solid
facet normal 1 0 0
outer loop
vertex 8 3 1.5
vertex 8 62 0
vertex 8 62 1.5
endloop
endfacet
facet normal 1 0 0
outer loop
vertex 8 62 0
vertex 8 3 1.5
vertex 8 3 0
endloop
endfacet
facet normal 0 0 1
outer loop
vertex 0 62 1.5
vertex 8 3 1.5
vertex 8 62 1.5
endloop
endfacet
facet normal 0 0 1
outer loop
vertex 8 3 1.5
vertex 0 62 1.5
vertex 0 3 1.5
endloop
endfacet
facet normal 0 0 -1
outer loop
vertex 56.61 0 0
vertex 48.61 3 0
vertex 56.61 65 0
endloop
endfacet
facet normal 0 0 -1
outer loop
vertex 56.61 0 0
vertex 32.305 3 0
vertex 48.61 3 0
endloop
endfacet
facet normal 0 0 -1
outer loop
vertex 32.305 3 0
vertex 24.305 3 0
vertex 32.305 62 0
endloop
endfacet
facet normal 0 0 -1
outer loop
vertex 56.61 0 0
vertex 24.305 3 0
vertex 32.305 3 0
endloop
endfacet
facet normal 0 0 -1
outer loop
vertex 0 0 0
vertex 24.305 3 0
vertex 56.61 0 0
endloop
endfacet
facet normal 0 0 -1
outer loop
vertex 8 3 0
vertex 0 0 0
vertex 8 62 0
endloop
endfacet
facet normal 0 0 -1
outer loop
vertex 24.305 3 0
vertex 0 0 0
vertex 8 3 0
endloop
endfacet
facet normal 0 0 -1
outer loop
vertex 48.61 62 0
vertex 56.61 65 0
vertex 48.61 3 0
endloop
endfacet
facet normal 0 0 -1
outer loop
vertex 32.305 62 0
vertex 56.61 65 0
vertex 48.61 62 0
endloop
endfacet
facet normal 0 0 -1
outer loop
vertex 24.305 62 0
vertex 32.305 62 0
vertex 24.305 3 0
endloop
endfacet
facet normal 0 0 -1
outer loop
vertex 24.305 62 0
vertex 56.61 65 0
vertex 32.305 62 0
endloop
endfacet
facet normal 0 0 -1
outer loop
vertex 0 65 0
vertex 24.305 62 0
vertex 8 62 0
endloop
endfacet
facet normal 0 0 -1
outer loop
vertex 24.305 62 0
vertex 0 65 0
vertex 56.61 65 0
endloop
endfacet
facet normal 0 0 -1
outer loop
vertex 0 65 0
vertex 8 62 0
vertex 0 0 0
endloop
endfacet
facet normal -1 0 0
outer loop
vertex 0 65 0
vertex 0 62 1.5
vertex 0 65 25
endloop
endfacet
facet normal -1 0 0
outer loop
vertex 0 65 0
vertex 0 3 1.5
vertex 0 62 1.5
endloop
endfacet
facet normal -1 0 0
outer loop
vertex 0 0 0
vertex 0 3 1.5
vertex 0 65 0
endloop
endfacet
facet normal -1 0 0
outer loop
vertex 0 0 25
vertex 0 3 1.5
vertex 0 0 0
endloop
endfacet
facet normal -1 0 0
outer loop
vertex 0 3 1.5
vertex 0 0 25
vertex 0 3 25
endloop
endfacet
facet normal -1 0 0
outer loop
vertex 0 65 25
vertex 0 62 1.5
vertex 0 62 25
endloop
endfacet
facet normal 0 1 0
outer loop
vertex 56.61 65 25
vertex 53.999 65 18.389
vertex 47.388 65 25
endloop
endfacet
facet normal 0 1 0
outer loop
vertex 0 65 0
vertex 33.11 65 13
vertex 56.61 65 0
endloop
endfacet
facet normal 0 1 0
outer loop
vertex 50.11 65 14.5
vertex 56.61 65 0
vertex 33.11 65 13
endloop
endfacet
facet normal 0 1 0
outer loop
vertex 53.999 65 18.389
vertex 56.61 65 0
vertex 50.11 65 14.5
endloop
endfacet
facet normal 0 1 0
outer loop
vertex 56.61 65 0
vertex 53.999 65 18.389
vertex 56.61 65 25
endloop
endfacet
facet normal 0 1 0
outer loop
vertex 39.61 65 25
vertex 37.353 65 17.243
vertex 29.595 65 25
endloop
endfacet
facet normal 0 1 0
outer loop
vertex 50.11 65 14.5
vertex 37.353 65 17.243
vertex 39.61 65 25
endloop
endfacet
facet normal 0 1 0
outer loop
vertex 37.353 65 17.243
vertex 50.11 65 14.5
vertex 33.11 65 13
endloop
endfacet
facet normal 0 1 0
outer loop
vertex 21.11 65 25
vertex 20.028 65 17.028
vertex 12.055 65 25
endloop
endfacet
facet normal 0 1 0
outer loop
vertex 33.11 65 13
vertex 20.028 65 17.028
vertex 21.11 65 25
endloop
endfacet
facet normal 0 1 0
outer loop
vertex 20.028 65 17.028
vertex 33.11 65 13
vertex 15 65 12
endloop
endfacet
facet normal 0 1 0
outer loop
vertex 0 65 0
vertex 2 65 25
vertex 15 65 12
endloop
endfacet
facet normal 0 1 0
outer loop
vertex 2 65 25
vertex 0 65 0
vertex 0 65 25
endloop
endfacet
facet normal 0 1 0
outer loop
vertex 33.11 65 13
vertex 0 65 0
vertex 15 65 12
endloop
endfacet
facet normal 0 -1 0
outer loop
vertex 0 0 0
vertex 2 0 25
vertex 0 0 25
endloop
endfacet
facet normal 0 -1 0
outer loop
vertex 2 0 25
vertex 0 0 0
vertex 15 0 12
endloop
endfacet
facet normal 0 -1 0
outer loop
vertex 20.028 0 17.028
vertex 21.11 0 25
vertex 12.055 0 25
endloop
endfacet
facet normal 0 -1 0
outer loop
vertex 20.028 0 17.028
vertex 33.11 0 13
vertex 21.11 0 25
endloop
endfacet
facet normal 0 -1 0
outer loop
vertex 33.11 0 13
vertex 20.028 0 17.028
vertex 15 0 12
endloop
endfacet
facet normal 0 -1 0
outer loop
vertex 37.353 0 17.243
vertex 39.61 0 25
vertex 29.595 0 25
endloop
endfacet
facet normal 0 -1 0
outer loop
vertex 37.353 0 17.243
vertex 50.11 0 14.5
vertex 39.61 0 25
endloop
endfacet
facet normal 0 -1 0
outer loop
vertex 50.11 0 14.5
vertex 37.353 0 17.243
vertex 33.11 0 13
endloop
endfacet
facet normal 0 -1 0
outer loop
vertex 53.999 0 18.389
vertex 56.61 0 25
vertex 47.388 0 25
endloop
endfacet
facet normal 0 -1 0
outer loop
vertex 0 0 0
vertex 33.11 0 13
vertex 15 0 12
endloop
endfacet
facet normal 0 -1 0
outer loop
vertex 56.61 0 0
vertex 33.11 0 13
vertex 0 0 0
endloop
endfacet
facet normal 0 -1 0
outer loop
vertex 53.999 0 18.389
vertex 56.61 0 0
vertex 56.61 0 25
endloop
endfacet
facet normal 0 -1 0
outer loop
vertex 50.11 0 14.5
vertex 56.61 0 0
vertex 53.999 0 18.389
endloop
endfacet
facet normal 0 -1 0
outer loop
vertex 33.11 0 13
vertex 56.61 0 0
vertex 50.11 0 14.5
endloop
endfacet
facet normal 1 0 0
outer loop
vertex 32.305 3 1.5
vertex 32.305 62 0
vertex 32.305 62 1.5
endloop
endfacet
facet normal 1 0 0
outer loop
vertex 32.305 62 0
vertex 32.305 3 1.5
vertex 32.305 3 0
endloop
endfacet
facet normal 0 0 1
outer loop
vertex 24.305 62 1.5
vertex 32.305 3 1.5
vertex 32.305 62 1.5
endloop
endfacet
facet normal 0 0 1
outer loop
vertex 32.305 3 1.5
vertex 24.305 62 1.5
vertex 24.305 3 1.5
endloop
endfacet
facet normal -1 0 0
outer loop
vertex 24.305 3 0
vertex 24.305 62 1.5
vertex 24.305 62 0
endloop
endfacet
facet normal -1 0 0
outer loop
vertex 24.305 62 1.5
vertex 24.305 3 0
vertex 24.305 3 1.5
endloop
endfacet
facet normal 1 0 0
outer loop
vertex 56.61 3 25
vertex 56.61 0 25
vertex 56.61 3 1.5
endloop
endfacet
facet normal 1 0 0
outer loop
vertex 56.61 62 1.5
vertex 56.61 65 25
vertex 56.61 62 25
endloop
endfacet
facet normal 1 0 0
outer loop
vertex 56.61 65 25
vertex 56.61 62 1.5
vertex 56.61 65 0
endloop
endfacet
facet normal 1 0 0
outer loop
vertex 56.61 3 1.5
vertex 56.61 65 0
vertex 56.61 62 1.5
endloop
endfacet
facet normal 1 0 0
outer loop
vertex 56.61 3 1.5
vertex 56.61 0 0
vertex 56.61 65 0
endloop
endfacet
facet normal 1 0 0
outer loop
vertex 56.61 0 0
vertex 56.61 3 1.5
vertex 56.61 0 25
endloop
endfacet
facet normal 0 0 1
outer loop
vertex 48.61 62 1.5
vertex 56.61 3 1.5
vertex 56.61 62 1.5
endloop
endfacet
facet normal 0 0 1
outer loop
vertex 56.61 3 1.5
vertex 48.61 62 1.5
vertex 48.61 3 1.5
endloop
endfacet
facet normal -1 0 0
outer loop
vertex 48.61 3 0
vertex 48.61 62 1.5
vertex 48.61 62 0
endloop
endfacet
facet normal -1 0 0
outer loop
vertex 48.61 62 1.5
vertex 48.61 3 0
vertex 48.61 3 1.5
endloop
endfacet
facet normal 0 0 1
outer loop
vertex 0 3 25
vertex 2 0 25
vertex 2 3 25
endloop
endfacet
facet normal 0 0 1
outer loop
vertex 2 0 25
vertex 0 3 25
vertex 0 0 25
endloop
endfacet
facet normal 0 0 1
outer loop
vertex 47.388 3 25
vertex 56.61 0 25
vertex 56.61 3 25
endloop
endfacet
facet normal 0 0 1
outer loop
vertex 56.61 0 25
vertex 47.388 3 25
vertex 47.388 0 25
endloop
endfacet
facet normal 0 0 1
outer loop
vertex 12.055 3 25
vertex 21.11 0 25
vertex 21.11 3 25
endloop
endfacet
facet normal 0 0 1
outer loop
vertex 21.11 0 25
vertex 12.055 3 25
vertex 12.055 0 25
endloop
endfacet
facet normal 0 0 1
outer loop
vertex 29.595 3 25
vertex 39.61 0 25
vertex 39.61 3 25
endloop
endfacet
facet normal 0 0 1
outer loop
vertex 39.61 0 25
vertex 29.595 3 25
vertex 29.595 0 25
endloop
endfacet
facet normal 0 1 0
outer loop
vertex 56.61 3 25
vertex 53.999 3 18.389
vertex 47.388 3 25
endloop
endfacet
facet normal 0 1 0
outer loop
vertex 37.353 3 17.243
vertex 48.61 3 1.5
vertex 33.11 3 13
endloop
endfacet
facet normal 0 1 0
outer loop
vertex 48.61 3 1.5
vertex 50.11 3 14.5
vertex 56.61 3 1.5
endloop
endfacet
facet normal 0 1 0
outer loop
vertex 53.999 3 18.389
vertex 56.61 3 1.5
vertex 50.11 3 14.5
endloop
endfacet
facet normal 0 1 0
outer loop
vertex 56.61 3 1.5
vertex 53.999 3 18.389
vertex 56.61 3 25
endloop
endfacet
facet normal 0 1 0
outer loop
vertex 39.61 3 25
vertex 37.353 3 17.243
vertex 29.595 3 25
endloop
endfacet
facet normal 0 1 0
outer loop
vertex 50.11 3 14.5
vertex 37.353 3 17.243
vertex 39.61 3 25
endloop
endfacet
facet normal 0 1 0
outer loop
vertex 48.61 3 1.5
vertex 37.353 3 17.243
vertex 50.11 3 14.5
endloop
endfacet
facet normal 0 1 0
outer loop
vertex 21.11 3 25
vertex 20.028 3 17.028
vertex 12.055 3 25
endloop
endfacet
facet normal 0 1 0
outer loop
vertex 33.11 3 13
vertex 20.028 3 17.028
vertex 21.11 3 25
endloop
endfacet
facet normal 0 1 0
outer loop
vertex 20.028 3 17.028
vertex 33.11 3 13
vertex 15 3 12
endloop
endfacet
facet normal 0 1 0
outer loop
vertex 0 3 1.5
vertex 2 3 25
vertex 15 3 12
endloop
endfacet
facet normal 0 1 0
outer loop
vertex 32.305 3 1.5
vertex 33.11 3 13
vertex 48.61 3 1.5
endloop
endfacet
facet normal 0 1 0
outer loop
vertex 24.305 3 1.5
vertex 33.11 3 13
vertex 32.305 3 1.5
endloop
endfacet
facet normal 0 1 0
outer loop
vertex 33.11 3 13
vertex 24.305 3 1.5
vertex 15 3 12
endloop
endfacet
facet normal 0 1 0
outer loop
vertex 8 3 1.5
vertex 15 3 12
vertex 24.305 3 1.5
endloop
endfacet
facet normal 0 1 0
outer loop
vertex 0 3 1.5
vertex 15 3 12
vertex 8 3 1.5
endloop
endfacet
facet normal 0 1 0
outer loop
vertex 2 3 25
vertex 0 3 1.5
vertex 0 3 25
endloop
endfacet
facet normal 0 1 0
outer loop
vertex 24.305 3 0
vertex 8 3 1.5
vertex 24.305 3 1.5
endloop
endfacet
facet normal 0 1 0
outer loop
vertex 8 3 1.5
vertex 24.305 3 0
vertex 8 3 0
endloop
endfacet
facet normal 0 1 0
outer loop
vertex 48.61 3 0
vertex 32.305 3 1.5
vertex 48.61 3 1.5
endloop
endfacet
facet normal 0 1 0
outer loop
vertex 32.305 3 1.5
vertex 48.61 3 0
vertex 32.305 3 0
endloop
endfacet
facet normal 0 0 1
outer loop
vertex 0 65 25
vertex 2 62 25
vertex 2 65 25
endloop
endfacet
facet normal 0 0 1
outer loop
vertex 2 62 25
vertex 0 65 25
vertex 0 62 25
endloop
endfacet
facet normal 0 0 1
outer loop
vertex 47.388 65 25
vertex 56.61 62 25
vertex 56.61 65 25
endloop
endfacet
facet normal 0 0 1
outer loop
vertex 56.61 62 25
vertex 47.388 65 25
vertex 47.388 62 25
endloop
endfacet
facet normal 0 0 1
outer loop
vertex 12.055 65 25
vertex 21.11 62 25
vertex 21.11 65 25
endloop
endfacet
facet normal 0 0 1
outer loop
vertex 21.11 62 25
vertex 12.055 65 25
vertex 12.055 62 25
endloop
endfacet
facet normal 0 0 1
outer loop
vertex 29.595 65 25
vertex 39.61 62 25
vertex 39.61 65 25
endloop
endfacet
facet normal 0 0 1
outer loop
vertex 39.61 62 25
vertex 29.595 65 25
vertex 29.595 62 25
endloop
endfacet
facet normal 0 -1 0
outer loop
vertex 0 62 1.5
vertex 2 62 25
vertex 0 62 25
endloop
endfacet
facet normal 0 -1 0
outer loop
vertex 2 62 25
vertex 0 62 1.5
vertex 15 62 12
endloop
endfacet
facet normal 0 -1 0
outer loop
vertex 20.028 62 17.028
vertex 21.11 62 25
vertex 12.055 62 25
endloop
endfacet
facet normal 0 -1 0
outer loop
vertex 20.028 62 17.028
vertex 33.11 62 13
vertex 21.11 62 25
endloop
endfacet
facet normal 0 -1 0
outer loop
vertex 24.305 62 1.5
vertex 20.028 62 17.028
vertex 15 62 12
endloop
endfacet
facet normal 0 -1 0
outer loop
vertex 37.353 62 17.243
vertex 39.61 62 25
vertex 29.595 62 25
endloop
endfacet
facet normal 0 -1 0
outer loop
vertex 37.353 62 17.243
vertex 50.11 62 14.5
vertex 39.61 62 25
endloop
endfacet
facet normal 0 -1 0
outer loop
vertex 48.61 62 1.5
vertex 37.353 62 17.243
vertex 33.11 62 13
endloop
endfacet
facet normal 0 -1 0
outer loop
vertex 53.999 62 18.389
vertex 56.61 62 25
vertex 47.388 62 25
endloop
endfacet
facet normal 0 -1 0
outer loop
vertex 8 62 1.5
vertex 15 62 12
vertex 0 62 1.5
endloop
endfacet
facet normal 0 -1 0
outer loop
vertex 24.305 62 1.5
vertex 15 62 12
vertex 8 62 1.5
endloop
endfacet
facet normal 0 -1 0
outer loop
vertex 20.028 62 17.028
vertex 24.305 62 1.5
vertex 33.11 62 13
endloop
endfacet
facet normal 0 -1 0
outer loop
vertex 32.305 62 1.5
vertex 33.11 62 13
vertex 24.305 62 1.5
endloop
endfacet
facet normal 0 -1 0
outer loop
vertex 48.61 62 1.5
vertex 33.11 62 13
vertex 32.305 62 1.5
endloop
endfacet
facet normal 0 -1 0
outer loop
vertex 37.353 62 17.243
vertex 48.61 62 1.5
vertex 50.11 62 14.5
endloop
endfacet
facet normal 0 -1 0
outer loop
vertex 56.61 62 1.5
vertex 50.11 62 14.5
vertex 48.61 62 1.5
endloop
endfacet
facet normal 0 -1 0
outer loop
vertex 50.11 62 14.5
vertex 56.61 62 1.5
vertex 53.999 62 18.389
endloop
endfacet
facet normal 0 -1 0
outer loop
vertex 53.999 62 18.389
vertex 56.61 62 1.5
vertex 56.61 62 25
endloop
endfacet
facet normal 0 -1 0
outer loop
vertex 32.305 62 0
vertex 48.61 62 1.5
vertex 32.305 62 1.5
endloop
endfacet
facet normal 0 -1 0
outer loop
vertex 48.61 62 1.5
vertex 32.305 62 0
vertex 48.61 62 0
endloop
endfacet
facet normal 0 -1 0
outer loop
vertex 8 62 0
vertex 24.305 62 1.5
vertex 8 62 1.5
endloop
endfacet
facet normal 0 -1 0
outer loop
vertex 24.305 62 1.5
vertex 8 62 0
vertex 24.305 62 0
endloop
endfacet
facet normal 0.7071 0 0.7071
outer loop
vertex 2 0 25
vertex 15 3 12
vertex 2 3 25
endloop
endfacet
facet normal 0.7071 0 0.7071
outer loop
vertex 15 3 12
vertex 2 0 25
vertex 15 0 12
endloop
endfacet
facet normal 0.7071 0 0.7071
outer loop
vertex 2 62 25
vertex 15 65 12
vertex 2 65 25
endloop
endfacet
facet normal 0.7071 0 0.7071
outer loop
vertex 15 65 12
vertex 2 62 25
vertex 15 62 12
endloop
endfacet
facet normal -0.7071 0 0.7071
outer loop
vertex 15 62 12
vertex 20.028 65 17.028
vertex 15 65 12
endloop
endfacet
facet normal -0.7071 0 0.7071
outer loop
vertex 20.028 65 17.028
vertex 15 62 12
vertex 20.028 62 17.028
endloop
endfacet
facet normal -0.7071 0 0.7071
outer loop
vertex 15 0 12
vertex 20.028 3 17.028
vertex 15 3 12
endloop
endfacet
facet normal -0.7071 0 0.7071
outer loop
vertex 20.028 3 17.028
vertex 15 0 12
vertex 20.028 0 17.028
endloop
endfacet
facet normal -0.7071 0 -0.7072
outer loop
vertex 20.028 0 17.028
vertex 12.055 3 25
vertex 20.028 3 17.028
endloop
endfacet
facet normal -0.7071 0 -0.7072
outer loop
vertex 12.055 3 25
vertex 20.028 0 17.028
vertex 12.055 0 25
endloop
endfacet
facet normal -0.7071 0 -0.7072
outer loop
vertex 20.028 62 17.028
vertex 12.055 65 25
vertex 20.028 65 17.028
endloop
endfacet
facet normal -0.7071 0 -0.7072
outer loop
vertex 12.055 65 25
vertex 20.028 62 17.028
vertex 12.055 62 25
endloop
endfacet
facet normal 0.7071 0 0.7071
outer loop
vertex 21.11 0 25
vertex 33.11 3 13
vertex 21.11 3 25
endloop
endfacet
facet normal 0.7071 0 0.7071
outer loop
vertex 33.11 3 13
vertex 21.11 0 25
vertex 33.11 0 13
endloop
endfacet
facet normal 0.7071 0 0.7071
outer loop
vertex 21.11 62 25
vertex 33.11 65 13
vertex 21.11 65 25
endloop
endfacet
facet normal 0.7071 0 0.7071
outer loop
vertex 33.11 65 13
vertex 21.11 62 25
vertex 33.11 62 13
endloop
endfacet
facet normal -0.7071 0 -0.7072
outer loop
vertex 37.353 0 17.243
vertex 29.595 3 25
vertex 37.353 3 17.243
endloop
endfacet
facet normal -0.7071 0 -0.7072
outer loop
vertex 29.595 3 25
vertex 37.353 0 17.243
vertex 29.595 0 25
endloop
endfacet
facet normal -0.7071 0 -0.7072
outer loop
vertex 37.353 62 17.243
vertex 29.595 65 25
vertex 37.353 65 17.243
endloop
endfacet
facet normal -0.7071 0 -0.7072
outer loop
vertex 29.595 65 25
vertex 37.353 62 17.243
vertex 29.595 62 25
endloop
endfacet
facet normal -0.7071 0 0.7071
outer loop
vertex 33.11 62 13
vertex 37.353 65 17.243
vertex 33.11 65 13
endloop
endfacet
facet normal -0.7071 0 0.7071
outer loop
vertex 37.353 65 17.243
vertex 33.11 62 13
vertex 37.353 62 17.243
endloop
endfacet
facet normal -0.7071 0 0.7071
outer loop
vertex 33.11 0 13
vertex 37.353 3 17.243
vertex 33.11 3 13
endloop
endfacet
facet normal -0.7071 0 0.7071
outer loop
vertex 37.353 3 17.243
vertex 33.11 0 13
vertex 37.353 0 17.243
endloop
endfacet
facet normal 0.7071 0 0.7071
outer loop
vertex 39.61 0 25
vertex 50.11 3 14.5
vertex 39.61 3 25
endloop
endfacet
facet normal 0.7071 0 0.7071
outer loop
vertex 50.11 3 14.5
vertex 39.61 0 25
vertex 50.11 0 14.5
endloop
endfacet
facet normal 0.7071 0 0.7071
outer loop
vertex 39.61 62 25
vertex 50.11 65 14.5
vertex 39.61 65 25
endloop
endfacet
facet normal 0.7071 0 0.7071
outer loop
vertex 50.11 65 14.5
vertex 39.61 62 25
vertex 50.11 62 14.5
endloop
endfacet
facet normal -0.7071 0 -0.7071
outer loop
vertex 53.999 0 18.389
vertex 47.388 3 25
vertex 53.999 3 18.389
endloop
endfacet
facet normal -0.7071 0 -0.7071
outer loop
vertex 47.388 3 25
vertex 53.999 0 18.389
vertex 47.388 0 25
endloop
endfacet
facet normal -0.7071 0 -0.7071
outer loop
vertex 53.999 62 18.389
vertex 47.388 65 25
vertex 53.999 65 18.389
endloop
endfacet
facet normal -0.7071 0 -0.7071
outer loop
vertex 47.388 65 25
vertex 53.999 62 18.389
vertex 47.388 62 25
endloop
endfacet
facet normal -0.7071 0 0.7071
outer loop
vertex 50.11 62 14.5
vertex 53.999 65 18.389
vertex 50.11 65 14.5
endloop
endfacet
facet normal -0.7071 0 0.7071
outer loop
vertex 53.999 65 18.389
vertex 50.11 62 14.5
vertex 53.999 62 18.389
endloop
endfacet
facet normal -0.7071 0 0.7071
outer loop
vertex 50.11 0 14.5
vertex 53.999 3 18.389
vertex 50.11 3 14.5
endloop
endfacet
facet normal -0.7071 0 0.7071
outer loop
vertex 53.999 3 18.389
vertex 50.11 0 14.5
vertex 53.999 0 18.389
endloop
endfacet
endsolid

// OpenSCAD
widths        = [  7.11,  6.00,  5.50];
spacing       = [ 11,    11,    11];
pocket_depth  = [ 13,    12,    10.5];
imprint_width = [ 85,    80,    70];

base_width  = 65.0;
rail_width  =  3.0;
rail_height = 25.0;
cross_bars  =  3;

function sum (v, i = 0, r = 0) = i < len (v) ? sum (v, i + 1, r + v [i]) : r;
function subarray (list, begin = 0, end = -1) = [
  let (end = end < 0 ? len (list) : end)
    for (i = [begin : 1 : end - 1])
      list [i]
];

length = sum (widths) + sum (spacing) + 5;

difference () {
  union () {
    for (i = [0 : cross_bars - 1])
      translate ([i == 0 ? 0 : ((length / (cross_bars - 1)) * i) - (i == (cross_bars - 1) ? 8 : 4), 0, 0])
        cube ([8, base_width, 1.5]);
    translate ([0, 0, 0])
      cube ([length, rail_width, rail_height]);
    translate ([0, base_width - rail_width, 0])
      cube ([length, rail_width, rail_height]);
  }

  for (i = [0 : len (widths) - 1]) {
    translate ([15 + sum (subarray (spacing, 0, i)) + sum (subarray (widths, 0, i)), -0.01, rail_height - pocket_depth [i]])
      rotate ([0, 315, 0])
        cube ([widths [i], base_width + 0.02, 25]);
  }
}
